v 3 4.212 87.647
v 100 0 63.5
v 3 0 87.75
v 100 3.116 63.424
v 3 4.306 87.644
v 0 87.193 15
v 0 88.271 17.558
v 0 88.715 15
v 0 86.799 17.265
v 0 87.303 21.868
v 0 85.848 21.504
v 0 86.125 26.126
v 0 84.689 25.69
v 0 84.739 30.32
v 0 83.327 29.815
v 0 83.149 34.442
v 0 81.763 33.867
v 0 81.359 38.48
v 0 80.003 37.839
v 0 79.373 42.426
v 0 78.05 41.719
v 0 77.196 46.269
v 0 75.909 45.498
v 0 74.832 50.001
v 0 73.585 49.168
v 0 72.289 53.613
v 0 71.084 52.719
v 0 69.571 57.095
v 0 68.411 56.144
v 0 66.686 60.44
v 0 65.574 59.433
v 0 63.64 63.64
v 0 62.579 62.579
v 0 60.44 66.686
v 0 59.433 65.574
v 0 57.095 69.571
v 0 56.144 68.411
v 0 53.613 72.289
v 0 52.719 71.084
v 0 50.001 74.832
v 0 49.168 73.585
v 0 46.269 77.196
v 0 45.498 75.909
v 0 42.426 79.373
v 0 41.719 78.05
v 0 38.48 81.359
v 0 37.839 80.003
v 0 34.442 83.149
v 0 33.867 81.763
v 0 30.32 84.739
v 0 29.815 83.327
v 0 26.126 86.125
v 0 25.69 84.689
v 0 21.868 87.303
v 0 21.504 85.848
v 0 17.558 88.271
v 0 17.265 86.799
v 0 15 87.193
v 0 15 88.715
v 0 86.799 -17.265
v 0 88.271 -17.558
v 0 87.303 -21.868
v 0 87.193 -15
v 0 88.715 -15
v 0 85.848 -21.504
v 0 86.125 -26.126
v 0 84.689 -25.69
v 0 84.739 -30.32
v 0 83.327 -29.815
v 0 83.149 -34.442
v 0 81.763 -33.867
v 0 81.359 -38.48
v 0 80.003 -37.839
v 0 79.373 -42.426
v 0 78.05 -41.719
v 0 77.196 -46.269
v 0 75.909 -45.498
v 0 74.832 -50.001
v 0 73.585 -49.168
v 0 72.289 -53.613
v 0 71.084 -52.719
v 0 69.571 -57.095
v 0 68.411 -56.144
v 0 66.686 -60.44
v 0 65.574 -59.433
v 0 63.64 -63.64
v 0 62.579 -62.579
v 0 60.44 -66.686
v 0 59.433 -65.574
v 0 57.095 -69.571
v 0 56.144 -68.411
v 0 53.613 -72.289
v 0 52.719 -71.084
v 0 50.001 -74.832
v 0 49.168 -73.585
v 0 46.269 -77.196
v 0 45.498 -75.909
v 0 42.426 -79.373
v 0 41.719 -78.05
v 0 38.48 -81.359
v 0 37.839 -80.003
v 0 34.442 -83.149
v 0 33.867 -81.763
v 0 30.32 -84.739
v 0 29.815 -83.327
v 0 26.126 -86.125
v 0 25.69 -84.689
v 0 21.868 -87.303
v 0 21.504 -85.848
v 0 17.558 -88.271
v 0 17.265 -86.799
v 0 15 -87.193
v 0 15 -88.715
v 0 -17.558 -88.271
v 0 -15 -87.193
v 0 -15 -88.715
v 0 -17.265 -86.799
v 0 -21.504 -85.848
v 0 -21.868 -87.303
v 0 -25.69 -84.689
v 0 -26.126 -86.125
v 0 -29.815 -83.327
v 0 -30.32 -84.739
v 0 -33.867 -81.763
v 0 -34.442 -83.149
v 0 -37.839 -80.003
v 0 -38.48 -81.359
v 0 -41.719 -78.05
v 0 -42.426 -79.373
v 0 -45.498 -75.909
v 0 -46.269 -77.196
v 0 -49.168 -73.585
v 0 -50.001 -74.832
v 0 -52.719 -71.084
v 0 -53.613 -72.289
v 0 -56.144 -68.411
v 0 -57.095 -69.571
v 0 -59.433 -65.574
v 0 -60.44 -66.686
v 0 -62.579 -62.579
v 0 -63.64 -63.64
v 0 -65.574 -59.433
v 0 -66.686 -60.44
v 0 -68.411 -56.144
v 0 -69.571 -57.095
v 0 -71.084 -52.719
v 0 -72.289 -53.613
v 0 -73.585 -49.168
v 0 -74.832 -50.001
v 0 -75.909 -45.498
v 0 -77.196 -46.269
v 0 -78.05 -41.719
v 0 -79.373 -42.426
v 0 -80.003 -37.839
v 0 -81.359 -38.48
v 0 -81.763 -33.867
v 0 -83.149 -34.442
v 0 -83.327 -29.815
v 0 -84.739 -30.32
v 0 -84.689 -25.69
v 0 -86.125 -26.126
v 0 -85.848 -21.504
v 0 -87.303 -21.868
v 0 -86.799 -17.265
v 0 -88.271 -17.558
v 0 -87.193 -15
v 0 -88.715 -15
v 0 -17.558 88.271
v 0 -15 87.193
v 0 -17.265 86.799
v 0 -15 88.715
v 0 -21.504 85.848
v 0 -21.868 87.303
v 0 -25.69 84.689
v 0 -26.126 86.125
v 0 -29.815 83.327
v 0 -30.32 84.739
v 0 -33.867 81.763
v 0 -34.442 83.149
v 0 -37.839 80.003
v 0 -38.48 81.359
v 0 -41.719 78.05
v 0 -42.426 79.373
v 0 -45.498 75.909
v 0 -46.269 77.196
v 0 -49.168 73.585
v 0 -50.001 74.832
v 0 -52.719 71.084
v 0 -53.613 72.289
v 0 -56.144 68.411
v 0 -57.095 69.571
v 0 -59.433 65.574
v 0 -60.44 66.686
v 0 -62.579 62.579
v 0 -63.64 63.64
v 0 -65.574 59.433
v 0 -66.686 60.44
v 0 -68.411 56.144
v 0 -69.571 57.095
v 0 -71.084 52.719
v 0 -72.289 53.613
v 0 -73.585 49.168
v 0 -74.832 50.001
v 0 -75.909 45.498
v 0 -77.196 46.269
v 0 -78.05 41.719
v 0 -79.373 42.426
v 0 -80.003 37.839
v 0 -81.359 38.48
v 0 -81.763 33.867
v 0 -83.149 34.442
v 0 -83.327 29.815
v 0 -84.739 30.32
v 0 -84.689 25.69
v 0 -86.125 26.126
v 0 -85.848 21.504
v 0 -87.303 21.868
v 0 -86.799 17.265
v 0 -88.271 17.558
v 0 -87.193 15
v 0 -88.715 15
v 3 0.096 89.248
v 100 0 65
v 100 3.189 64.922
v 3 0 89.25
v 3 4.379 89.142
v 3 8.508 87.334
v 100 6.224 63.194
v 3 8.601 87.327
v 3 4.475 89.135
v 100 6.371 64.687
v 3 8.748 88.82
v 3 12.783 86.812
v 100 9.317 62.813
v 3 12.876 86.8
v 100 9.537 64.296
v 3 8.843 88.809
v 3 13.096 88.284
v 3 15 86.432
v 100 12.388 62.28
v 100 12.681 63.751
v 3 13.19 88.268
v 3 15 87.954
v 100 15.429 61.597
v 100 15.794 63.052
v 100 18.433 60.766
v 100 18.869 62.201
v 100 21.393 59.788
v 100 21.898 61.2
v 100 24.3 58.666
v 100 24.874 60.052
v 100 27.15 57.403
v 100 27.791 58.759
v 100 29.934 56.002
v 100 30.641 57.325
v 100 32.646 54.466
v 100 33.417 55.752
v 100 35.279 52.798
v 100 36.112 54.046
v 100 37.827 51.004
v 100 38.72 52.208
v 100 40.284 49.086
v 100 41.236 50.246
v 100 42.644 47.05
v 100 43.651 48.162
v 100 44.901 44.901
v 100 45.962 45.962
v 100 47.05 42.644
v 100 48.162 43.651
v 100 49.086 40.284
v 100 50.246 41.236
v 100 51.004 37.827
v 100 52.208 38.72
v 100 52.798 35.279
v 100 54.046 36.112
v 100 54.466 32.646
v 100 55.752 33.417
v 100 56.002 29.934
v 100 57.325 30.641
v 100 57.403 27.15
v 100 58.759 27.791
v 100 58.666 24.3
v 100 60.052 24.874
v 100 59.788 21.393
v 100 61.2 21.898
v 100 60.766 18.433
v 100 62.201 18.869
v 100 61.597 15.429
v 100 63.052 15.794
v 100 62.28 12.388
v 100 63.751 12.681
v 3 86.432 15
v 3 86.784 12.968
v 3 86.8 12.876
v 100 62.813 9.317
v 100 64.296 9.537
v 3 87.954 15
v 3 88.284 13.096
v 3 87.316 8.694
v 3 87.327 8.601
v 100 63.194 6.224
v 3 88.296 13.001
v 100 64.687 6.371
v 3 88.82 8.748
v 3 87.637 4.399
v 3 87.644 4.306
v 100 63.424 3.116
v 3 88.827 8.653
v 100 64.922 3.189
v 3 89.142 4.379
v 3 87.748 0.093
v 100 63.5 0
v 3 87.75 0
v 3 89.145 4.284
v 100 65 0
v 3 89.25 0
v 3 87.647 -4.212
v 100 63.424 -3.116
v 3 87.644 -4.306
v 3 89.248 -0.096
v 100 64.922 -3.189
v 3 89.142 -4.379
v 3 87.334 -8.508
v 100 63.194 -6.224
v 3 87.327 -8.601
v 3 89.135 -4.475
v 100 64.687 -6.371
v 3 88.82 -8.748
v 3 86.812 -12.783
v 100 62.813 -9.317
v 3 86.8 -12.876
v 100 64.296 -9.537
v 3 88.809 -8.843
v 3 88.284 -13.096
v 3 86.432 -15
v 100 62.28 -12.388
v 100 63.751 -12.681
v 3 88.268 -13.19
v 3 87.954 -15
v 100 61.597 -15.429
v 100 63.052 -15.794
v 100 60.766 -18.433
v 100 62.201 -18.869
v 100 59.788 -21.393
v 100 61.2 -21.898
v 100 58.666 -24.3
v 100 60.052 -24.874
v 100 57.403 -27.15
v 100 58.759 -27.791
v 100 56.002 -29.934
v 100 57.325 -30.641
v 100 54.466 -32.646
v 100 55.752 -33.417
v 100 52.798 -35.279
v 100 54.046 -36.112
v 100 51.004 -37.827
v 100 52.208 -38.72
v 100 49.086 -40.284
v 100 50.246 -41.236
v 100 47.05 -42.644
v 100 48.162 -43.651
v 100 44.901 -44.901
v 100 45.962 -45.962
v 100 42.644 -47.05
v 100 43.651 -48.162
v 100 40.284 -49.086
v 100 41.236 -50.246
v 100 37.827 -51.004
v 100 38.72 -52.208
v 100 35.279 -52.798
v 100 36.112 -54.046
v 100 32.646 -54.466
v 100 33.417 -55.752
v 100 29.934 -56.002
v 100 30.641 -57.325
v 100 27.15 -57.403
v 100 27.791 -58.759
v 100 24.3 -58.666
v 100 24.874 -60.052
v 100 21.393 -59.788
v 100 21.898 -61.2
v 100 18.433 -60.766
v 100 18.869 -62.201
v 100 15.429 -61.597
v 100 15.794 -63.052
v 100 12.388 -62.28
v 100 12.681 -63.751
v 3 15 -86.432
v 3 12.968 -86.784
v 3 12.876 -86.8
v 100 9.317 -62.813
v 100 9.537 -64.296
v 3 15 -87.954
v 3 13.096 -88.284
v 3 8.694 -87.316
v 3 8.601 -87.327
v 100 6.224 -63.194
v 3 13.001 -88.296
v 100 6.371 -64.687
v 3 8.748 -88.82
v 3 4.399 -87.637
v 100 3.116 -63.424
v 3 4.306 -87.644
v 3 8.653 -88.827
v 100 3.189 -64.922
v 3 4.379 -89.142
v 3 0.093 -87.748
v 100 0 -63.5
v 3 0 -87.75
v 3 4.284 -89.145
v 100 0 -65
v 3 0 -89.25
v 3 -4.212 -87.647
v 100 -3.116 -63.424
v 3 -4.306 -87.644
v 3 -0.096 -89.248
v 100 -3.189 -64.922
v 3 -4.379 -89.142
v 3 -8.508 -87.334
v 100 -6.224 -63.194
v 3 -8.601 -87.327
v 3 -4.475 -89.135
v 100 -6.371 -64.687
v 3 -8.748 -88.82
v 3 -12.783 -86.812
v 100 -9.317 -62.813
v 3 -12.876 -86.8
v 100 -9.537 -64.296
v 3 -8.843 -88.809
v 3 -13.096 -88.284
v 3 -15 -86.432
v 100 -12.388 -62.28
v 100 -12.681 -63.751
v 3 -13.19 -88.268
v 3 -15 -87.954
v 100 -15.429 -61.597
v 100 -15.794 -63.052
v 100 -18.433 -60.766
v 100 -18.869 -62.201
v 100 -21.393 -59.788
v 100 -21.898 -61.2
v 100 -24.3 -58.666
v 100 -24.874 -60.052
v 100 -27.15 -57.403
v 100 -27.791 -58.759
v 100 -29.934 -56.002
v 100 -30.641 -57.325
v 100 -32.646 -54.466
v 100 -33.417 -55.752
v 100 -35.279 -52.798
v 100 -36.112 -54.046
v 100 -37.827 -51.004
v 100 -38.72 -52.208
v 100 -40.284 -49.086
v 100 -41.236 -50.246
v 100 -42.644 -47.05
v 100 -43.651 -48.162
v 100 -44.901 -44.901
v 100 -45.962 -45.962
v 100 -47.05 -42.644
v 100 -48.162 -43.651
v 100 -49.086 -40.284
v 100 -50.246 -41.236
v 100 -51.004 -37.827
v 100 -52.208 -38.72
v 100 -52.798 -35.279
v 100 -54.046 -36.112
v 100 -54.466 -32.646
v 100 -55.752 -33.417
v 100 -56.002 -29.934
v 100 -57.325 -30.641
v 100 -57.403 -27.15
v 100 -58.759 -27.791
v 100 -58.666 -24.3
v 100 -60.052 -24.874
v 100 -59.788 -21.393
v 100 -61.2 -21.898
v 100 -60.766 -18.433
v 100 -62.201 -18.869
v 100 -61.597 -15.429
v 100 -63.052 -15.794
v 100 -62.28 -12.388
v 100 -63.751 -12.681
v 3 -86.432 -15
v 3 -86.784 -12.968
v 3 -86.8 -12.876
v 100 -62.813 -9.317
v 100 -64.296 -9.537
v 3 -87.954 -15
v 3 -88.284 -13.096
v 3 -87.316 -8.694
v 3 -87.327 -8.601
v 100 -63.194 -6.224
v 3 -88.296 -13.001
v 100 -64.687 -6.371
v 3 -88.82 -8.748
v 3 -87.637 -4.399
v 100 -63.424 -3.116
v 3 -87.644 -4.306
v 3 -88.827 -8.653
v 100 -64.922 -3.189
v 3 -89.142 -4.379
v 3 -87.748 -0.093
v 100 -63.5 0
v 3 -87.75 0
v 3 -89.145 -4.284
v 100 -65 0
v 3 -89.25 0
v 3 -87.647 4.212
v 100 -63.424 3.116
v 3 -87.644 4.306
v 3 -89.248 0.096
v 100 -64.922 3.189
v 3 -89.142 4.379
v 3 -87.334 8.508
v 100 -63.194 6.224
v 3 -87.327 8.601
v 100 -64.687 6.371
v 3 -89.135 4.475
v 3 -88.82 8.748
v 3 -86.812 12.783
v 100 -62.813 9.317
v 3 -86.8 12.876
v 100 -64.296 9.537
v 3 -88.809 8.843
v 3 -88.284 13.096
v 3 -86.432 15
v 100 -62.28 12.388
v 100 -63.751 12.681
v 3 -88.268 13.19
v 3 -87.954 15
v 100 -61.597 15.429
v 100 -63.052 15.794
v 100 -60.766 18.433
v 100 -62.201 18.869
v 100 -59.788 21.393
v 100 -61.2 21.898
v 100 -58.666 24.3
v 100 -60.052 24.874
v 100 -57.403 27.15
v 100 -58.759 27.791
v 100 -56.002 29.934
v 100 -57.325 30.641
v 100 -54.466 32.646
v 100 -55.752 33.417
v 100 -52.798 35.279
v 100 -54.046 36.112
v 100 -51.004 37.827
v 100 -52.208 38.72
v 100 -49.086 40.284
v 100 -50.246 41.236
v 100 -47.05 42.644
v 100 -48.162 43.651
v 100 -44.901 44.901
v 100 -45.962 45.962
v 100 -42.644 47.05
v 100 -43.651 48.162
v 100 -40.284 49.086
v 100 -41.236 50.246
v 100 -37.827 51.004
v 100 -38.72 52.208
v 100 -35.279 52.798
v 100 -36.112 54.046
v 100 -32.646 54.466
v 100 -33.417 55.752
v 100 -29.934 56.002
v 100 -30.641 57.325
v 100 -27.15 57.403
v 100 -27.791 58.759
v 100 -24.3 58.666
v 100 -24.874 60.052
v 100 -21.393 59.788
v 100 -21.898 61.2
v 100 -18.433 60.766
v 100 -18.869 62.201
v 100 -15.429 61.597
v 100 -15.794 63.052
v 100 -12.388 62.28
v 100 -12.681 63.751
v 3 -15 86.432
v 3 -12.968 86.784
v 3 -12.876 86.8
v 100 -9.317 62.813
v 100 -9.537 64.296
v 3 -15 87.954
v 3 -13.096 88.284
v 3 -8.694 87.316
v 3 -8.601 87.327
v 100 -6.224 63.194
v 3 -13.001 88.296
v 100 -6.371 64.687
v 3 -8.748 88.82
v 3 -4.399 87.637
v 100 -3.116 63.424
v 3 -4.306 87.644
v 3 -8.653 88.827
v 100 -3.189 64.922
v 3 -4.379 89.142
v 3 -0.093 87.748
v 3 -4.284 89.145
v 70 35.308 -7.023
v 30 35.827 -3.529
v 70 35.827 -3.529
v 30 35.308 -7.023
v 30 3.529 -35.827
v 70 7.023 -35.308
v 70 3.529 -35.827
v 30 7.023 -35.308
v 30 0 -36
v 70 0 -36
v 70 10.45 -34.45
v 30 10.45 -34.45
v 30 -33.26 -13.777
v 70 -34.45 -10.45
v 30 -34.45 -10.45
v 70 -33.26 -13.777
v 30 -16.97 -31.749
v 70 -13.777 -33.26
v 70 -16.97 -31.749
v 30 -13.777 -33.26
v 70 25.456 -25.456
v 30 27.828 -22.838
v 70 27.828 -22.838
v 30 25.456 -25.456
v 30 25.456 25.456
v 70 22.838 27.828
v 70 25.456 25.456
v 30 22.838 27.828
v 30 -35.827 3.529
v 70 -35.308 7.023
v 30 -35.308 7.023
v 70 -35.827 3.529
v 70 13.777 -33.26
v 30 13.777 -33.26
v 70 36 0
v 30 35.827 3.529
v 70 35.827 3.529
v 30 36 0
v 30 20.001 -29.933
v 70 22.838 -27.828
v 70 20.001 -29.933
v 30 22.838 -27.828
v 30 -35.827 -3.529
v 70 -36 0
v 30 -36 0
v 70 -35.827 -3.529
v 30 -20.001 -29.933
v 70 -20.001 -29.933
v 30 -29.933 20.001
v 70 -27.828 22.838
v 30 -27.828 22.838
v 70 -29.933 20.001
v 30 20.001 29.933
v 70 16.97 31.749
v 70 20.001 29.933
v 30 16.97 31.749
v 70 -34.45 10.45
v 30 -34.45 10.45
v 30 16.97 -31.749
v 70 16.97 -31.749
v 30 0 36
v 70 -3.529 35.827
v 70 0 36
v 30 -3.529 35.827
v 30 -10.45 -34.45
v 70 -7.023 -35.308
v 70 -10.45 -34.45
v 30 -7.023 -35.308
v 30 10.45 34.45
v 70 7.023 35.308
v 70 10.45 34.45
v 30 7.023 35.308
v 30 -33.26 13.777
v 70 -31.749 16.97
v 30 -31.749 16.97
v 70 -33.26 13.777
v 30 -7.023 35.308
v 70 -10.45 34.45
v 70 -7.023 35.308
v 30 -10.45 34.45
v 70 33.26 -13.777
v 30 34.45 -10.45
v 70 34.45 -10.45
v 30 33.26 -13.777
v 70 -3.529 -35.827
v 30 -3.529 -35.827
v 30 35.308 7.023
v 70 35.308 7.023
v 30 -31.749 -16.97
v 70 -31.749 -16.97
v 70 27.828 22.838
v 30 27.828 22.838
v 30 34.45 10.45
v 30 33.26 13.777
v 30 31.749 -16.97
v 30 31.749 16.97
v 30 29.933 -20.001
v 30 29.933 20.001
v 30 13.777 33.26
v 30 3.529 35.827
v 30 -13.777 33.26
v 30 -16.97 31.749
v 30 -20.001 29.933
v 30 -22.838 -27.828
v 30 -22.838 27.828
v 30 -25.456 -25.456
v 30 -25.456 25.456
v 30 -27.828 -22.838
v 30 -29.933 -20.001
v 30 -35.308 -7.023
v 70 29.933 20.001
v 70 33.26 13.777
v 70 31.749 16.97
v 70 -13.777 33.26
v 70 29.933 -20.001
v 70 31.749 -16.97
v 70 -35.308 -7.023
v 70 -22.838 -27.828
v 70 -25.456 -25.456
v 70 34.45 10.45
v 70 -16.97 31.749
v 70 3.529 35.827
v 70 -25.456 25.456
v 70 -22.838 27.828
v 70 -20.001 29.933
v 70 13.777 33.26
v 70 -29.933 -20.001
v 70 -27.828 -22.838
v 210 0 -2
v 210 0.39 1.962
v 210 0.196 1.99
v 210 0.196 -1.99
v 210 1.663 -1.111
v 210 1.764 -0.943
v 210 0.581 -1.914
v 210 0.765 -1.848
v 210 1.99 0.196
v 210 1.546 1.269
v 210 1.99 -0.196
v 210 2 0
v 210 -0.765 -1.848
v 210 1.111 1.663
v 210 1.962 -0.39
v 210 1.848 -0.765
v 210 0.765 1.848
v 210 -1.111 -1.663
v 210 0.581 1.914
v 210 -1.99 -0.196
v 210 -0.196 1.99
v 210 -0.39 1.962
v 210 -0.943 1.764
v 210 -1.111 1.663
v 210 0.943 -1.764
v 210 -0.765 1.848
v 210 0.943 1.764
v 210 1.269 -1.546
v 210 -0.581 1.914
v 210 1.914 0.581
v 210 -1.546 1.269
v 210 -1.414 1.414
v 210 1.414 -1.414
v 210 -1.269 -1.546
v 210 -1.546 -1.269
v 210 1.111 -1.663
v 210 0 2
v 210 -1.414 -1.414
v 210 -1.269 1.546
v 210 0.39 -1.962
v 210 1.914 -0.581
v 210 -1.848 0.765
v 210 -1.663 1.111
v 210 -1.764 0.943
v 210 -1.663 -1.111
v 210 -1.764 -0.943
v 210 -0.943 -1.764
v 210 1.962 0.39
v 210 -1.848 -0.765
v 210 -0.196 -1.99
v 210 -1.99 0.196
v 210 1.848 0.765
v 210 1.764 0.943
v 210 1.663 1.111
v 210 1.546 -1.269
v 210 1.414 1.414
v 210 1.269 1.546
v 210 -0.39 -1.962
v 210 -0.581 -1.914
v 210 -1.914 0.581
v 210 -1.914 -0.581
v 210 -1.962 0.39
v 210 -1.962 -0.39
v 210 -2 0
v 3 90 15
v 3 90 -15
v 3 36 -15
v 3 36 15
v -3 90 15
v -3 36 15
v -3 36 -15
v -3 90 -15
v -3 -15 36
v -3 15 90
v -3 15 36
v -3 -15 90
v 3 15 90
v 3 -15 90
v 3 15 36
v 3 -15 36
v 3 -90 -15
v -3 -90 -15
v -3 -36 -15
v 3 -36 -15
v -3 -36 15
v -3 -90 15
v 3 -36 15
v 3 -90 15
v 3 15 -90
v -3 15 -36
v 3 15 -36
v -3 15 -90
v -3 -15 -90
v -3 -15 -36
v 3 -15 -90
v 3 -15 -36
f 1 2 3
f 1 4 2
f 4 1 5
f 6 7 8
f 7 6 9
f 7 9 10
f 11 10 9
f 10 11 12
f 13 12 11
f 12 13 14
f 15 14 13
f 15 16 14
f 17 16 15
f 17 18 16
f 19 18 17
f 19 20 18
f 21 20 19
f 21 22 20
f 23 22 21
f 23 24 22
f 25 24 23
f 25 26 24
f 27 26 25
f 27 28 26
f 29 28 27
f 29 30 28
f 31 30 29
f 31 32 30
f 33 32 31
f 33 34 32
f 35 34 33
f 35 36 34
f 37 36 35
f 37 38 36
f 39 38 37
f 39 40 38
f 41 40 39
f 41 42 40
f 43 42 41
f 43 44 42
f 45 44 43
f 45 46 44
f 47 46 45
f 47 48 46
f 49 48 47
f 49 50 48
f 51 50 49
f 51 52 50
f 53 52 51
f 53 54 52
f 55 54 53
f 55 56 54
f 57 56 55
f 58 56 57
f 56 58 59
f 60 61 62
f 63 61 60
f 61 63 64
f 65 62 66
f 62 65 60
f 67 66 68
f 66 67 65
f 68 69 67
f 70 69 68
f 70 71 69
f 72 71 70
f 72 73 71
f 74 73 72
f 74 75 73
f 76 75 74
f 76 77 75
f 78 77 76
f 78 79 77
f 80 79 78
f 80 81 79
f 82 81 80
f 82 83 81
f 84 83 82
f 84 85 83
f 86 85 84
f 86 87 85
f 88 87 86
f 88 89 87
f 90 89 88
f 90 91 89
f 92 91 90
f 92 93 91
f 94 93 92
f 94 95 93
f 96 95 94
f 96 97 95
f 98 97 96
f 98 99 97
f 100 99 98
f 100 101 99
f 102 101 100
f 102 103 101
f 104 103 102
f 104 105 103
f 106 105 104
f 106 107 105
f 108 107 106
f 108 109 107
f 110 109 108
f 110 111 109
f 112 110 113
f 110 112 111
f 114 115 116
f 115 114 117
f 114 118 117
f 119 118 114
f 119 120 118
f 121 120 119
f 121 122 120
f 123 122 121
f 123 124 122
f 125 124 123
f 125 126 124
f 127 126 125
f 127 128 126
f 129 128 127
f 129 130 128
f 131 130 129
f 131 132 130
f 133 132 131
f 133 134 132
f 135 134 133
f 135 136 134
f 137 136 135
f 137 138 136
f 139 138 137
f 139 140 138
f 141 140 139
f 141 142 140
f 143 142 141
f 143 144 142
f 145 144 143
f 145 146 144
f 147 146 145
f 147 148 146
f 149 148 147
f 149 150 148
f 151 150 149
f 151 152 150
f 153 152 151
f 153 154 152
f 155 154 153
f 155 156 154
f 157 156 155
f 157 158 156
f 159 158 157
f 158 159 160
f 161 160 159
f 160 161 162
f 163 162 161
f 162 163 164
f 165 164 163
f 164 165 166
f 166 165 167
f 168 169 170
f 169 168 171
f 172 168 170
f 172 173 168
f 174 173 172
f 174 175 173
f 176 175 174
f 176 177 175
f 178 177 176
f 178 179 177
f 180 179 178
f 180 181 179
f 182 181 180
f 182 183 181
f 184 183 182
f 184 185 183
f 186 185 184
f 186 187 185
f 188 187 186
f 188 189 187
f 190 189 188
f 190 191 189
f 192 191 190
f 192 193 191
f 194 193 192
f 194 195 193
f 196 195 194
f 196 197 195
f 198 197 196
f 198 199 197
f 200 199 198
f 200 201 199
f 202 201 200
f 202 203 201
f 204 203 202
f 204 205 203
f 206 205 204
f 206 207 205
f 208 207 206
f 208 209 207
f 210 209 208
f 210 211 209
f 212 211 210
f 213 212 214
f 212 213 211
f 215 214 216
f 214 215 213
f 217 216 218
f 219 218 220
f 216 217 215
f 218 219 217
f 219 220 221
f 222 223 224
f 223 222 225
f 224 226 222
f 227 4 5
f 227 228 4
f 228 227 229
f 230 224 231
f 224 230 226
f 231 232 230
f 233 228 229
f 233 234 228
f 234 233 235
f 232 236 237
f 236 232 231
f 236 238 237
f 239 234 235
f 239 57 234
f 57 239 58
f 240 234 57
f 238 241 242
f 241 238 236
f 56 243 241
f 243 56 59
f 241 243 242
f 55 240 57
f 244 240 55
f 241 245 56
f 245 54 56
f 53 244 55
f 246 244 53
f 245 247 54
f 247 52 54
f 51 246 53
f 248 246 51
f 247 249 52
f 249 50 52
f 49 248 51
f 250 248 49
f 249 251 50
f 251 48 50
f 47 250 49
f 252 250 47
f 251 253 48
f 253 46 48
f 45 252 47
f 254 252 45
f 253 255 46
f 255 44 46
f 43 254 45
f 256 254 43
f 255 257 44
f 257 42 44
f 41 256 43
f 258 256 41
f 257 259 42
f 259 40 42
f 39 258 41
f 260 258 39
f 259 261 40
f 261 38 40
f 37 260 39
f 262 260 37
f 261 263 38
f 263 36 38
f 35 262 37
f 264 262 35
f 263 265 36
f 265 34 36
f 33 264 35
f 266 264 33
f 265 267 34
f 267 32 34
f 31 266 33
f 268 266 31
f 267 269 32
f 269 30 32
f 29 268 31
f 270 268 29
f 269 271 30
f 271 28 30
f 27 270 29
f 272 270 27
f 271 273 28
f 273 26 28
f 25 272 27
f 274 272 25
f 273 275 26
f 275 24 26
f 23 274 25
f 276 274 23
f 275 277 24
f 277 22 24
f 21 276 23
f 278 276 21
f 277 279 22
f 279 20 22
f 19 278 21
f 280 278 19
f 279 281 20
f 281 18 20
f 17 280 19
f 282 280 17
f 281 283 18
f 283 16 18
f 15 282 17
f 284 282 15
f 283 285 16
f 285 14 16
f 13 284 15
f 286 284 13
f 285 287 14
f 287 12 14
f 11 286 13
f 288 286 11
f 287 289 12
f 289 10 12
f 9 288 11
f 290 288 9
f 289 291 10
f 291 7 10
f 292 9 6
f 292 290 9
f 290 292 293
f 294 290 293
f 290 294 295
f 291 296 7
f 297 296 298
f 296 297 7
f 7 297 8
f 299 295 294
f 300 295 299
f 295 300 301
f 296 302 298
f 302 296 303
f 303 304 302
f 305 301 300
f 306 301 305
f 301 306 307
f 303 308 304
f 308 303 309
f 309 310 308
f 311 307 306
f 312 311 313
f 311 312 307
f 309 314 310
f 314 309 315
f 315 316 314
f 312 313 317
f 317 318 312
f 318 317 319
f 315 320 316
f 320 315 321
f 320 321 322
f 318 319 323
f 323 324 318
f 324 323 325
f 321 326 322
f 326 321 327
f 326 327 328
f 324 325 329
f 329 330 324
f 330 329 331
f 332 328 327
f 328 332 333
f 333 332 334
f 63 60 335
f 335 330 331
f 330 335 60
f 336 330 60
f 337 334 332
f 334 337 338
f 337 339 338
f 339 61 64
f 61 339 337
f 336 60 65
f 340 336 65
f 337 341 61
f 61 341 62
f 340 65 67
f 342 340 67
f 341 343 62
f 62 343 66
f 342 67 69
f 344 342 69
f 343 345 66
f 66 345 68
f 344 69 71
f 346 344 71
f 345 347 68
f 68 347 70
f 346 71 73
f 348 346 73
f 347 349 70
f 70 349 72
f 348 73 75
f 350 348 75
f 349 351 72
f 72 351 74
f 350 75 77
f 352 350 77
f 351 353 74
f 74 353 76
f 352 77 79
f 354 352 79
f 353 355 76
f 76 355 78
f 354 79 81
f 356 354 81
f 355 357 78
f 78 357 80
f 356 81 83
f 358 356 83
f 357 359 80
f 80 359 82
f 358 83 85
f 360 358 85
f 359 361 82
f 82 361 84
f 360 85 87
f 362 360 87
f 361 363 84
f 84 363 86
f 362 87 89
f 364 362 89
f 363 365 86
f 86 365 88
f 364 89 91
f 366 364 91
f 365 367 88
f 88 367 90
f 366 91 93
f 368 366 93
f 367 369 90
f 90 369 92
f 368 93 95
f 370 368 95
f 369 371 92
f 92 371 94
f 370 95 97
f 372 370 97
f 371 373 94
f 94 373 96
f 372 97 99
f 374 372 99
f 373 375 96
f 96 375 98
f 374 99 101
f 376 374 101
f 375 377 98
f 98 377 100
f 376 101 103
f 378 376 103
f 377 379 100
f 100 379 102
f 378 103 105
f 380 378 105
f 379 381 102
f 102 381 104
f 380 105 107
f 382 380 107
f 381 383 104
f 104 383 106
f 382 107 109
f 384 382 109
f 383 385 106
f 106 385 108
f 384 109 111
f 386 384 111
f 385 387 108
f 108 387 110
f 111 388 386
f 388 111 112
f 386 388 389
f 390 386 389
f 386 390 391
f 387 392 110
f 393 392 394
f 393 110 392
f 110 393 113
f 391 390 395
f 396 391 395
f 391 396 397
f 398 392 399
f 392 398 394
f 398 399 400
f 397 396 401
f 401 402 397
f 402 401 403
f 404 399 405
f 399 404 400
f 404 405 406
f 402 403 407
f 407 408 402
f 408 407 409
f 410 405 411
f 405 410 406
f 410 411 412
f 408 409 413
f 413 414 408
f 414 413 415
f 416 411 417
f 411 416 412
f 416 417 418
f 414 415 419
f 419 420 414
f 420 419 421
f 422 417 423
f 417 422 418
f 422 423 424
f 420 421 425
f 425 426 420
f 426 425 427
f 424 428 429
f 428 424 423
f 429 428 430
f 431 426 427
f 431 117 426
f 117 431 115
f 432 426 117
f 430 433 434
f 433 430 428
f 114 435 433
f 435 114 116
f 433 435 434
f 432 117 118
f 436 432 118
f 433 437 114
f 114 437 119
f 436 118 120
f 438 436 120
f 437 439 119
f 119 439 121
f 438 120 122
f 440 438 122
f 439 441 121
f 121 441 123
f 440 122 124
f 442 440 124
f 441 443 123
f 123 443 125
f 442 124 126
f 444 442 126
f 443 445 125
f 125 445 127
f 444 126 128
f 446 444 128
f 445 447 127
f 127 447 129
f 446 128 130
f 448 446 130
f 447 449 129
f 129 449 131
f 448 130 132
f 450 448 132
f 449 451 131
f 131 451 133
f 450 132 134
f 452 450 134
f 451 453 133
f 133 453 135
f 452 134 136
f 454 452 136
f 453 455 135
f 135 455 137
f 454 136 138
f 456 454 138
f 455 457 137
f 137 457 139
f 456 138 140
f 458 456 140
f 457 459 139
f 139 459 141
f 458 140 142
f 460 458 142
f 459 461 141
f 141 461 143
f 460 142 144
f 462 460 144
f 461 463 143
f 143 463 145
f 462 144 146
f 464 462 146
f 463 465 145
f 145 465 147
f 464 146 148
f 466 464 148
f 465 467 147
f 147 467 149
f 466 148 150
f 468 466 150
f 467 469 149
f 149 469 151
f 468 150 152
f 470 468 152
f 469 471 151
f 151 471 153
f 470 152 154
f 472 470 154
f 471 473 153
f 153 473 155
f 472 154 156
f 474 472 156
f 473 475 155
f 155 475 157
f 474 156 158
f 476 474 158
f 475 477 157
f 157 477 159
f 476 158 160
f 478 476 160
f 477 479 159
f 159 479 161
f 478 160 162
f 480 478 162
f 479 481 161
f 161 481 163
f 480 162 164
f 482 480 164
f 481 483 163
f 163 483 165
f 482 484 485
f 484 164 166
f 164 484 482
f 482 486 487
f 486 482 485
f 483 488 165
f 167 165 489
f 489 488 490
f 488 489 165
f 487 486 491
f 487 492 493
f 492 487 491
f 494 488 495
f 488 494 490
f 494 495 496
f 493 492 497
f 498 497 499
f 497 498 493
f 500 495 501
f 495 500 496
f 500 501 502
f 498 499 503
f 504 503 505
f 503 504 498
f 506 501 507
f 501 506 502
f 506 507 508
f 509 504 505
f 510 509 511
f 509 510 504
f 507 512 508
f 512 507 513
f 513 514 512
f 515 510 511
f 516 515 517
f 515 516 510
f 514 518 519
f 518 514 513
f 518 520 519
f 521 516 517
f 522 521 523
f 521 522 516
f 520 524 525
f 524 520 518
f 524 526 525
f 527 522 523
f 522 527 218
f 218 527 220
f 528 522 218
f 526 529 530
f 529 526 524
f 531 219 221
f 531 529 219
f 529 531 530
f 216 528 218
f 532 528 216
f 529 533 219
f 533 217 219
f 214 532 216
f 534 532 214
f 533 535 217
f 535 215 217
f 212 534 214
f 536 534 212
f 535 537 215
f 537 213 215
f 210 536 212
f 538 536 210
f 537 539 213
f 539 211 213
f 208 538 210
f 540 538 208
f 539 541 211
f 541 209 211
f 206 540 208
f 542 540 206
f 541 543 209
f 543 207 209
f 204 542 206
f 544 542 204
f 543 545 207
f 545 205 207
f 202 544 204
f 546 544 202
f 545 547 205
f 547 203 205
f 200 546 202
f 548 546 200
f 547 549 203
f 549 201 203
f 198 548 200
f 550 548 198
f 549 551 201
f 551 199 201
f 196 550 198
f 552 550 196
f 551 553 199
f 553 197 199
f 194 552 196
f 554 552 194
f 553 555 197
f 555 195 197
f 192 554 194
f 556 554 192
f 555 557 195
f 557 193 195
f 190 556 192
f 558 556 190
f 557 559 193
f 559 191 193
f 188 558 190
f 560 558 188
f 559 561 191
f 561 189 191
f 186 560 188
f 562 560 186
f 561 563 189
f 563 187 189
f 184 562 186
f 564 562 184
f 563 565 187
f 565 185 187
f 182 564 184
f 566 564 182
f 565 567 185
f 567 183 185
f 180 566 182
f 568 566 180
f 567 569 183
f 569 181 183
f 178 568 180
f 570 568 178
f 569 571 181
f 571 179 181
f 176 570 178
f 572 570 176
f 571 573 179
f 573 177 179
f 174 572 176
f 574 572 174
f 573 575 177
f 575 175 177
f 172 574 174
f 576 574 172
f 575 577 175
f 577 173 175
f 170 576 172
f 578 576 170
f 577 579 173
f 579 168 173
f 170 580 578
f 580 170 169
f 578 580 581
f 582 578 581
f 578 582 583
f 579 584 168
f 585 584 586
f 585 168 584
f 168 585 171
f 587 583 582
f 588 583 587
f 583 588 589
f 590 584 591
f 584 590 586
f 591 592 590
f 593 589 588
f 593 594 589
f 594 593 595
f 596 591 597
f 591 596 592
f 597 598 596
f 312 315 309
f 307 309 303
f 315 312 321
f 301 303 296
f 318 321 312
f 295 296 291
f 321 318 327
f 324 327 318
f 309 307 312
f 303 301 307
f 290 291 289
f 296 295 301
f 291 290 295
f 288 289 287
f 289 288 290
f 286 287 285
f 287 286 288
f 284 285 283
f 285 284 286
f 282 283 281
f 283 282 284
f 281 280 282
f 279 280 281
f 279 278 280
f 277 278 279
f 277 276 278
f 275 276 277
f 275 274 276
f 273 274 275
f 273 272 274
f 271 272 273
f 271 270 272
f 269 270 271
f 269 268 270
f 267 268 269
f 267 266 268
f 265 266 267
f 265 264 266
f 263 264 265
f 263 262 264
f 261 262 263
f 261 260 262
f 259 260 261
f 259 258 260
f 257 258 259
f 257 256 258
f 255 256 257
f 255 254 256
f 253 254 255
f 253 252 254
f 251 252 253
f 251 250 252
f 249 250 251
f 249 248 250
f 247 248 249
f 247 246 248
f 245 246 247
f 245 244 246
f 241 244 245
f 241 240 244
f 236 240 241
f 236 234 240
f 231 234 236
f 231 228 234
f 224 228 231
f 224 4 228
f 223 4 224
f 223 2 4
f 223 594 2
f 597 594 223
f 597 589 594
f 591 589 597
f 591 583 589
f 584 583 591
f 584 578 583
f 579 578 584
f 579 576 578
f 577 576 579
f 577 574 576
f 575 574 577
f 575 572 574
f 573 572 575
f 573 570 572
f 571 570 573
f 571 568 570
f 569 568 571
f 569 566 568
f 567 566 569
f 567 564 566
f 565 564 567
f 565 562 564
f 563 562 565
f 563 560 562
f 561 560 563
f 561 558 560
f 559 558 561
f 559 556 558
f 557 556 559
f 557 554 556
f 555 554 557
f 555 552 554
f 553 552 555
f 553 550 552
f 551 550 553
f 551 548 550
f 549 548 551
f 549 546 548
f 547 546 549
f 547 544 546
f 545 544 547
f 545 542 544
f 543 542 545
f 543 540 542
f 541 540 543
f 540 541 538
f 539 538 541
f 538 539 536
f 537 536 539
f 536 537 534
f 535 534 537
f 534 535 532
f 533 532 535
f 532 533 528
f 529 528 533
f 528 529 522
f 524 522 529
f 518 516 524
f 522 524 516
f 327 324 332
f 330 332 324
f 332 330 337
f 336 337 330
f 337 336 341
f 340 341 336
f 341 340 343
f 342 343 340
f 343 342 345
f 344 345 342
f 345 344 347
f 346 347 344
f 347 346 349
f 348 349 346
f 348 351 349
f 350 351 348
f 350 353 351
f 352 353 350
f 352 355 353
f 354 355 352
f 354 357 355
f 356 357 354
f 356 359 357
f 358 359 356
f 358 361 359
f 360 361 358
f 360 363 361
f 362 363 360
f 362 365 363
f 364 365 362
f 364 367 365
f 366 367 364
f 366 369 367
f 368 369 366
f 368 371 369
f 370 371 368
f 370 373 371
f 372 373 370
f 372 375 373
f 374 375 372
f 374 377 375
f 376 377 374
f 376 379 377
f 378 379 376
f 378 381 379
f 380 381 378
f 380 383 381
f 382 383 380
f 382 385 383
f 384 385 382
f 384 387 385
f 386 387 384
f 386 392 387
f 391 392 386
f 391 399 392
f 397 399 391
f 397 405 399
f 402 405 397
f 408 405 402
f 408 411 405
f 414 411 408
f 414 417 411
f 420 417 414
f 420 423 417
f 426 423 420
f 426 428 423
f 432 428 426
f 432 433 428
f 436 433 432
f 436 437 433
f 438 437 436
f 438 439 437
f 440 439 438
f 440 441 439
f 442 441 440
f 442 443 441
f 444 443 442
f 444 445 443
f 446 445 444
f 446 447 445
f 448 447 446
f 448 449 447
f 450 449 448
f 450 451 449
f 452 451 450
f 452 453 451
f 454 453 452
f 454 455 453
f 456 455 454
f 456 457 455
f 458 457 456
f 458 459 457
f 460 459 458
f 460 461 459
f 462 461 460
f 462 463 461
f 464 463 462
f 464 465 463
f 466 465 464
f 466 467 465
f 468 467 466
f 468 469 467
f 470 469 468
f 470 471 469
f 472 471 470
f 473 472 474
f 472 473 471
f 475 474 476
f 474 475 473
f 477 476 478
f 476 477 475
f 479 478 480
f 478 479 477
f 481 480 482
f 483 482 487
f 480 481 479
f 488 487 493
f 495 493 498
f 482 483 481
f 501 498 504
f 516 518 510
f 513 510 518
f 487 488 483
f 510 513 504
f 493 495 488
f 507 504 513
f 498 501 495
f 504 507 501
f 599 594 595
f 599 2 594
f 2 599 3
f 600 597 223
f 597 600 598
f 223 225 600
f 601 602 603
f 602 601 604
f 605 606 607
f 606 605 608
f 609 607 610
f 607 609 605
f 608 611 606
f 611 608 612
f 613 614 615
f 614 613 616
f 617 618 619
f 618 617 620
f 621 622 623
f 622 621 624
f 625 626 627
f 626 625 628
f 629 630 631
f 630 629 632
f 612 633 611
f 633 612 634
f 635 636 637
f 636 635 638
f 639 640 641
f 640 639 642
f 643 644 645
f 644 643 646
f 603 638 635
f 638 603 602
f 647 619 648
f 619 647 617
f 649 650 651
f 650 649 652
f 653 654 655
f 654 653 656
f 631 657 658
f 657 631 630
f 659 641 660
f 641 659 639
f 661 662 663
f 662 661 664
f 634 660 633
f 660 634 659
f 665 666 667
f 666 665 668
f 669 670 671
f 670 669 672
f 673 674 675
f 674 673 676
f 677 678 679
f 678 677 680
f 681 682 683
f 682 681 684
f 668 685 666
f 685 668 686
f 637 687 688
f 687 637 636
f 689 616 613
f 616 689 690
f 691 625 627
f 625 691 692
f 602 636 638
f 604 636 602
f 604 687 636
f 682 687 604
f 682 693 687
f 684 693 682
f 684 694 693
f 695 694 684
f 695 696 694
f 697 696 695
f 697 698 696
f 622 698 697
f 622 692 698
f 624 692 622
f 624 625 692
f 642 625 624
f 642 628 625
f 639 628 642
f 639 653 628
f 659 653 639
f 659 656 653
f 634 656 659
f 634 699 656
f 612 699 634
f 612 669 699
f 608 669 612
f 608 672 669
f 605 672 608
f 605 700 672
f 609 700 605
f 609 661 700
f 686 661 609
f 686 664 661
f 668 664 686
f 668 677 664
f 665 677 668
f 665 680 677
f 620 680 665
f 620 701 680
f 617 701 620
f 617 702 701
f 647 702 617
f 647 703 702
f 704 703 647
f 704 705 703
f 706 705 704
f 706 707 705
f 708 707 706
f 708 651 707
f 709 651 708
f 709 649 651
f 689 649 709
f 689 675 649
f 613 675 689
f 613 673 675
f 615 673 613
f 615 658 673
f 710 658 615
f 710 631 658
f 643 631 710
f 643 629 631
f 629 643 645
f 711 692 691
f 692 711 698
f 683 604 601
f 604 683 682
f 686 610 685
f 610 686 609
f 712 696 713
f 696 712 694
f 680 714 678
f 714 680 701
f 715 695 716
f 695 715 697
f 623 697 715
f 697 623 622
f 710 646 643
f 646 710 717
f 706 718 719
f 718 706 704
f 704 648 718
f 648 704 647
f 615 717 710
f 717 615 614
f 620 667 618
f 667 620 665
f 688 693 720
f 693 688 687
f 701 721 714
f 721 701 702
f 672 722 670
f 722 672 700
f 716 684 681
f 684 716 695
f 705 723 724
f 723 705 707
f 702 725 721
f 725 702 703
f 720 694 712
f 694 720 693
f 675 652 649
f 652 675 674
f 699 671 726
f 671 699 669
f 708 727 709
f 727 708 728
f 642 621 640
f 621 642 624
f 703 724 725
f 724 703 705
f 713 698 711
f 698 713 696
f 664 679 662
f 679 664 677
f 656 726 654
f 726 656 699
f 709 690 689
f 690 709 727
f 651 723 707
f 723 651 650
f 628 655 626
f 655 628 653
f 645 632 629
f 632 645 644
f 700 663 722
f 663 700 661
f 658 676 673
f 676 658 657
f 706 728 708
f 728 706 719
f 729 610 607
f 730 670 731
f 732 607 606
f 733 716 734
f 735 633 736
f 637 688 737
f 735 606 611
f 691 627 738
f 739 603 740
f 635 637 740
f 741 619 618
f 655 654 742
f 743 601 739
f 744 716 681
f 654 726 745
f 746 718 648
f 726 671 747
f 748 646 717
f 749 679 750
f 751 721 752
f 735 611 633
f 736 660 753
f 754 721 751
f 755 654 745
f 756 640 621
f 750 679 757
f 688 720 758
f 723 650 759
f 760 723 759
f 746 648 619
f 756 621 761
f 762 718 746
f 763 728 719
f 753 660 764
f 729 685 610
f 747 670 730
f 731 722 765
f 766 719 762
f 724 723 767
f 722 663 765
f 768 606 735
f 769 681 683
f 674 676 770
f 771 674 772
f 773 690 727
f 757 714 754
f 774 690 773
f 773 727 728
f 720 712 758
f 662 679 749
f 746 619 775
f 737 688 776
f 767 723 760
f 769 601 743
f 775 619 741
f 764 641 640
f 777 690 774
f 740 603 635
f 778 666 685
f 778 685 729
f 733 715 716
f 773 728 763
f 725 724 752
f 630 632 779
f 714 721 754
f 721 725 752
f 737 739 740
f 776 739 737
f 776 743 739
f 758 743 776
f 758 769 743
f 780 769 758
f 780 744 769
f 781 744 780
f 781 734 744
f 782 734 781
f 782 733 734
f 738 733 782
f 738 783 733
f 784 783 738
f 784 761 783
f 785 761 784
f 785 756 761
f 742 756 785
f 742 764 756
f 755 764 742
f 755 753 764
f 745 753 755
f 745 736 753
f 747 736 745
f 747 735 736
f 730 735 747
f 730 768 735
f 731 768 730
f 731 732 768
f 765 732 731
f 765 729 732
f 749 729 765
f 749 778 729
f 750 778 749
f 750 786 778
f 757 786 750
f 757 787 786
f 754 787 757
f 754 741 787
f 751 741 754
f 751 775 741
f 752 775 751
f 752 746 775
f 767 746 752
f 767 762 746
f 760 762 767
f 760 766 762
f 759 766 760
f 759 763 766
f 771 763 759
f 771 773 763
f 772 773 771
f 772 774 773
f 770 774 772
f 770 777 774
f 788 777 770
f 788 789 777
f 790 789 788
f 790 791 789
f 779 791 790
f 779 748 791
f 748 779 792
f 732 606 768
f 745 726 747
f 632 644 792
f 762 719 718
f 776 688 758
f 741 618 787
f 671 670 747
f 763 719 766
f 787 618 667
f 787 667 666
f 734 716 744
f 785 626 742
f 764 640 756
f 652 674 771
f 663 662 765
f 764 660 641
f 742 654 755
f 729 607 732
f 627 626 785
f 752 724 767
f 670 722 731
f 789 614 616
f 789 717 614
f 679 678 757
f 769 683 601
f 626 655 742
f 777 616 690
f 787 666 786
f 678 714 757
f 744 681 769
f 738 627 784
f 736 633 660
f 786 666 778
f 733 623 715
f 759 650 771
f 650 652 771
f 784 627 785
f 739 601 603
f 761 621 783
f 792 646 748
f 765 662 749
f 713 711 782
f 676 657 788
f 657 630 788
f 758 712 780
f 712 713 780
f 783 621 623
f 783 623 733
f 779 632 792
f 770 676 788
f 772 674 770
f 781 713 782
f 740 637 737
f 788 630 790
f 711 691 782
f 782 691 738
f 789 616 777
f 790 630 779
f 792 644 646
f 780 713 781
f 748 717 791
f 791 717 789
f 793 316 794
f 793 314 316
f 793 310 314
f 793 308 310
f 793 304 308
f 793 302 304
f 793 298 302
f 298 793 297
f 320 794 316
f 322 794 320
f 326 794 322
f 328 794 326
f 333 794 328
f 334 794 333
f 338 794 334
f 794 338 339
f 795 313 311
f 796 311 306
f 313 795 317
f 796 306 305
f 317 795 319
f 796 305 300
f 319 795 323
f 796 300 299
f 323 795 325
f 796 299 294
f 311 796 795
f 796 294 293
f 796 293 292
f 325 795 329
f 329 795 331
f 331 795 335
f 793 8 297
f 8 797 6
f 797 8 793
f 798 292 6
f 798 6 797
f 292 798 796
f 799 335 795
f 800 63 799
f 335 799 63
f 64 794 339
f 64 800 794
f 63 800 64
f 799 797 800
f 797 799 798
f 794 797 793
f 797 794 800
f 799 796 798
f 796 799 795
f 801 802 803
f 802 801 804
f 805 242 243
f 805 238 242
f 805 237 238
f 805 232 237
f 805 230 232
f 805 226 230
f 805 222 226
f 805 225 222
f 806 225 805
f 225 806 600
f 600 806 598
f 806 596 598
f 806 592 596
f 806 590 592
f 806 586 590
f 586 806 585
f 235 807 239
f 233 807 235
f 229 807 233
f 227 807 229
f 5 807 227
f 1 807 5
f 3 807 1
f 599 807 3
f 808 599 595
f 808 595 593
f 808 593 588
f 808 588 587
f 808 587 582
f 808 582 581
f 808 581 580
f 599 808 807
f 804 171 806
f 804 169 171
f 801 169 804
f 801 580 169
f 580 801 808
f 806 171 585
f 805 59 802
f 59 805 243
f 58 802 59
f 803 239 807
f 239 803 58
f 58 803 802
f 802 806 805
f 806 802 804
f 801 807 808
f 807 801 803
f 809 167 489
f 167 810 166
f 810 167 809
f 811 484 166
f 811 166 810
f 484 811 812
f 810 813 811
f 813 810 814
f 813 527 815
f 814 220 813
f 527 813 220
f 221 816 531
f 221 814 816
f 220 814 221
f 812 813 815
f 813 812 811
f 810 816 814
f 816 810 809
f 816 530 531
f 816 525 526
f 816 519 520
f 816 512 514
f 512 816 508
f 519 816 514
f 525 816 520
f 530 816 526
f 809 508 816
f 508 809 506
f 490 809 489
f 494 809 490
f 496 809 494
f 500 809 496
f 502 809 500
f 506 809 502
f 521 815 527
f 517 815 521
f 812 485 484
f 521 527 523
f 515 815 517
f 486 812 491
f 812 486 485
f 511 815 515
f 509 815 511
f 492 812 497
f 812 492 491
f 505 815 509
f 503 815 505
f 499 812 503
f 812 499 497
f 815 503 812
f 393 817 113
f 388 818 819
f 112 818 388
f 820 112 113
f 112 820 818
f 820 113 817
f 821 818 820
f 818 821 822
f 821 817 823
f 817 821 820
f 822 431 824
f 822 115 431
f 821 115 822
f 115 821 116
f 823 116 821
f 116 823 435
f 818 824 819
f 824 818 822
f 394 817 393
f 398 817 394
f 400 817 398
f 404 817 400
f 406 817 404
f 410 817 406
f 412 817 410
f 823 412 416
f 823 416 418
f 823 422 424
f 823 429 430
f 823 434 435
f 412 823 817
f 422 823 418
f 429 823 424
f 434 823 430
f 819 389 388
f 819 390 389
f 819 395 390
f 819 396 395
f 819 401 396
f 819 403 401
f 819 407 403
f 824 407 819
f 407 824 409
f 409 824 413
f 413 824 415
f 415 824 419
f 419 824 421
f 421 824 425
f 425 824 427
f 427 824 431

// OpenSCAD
// file: convergent_nozzle.scad
/**
 * @file convergent_nozzle.scad
 * @brief Convergent Exhaust Nozzle 3D Model
 * @details Models a smooth convergent contour using rotate_extrude and Bezier-like wall profiles.
 * 
 * Copyright (c) 2026 AEGIS-TF1 Systems Development Group.
 */

use <../utils/parametric_helpers.scad>

/**
 * @brief Convergent exhaust nozzle shell
 * @param inlet_diameter Inlet diameter matching turbine outer duct (mm)
 * @param exit_diameter Exit throat diameter (mm)
 * @param length Length along nozzle axis (mm)
 */
module convergent_nozzle(inlet_diameter=180, exit_diameter=120, length=90) {
    inlet_r = inlet_diameter / 2.0;
    exit_r = exit_diameter / 2.0;
    thickness = 1.5; // sheet metal thickness

    color("dimgrey")
    translate([length/2.0, 0, 0])
    rotate([0, 90, 0]) // Align nozzle along X-axis
    difference() {
        // Tapering outer profile
        rotate_extrude($fn=128)
        polygon(points=[
            [inlet_r, -length/2.0],
            [exit_r, length/2.0],
            [exit_r - thickness, length/2.0],
            [inlet_r - thickness, -length/2.0]
        ]);

        // Clean out central core if any polygon overlaps occurred
        cylinder(h=length + 2.0, r=exit_r - thickness, center=true, $fn=128);
    }
}

// Preview
convergent_nozzle();
// file: ../utils/parametric_helpers.scad
/**
 * @file parametric_helpers.scad
 * @brief Parametric 3D Modeling Utility Library
 * @details Contains shared constants, modules, and functions for geometric arraying,
 *          rounded cylinders, and coordinate transformations.
 * 
 * Copyright (c) 2026 AEGIS-TF1 Systems Development Group.
 */

// Global Constants
PI = 3.14159265358979323846;
GOLDEN_RATIO = 1.618033988749894;
TOLERANCE = 0.05;

// Functions
function deg2rad(d) = d * PI / 180.0;
function rad2deg(r) = r * 180.0 / PI;
function lerp(a, b, t) = a + (b - a) * t;

// Modules

/**
 * @brief Distributes children shapes in a circular array
 * @param n Number of instances
 * @param radius Radius of array circle
 */
module circular_array(n, radius) {
    for (i = [0 : n - 1]) {
        angle = i * 360.0 / n;
        rotate([0, 0, angle])
        translate([radius, 0, 0])
        children();
    }
}

/**
 * @brief Distributes children shapes in a linear array along X-axis
 * @param n Number of instances
 * @param spacing Distance between instances
 */
module linear_array(n, spacing) {
    for (i = [0 : n - 1]) {
        translate([i * spacing, 0, 0])
        children();
    }
}

/**
 * @brief Hollow cylinder (tube) along Z-axis
 * @param h Tube height
 * @param outer_r Outer radius
 * @param inner_r Inner radius
 * @param fn Resolution
 */
module tube(h, outer_r, inner_r, fn=64) {
    difference() {
        cylinder(h=h, r=outer_r, center=true, $fn=fn);
        cylinder(h=h + TOLERANCE * 2.0, r=inner_r, center=true, $fn=fn);
    }
}

/**
 * @brief Torus shape centered at origin
 * @param R Major radius (ring center distance)
 * @param r Minor radius (cross section radius)
 * @param fn Resolution
 */
module torus(R, r, fn=64) {
    rotate_extrude($fn=fn)
    translate([R, 0, 0])
    circle(r=r, $fn=fn);
}

/**
 * @brief Rounded cylinder (filleted top and bottom edges) using Minkowski
 * @param h Height
 * @param r Radius
 * @param fillet_r Edge radius
 * @param fn Resolution
 */
module rounded_cylinder(h, r, fillet_r, fn=64) {
    minkowski() {
        cylinder(h = h - 2.0 * fillet_r, r = r - fillet_r, center = true, $fn = fn);
        sphere(r = fillet_r, $fn = fn);
    }
}

/**
 * @brief 2D fillet helper
 * @param r Fillet radius
 */
module fillet_2d(r) {
    difference() {
        square([r, r]);
        translate([r, r])
        circle(r=r, $fn=64);
    }
}

/**
 * @brief 2D chamfer helper
 * @param size Chamfer length
 */
module chamfer_2d(size) {
    polygon(points=[[0,0], [size,0], [0,size]]);
}

/**
 * @brief Ball bearing assembly (inner ring, outer ring, balls)
 */
module bearing_assembly(inner_dia, outer_dia, width, num_balls=10) {
    color("silver")
    difference() {
        // Outer ring
        cylinder(h=width, r=outer_dia / 2.0, center=true, $fn=64);
        cylinder(h=width + 1.0, r=(outer_dia + inner_dia)/4.0 + (outer_dia - inner_dia)/8.0 * 0.8, center=true, $fn=64);
    }
    color("silver")
    difference() {
        // Inner ring
        cylinder(h=width, r=(outer_dia + inner_dia)/4.0 - (outer_dia - inner_dia)/8.0 * 0.8, center=true, $fn=64);
        cylinder(h=width + 1.0, r=inner_dia / 2.0, center=true, $fn=64);
    }
    // Balls (arranged in circular array)
    color([0.9, 0.92, 0.95]) // Chrome steel bearing balls
    let (ball_radius = (outer_dia - inner_dia) / 8.0, pitch_radius = (outer_dia + inner_dia) / 4.0) {
        circular_array(n=num_balls, radius=pitch_radius)
        sphere(r=ball_radius * 0.95, $fn=32);
    }
}

/**
 * @brief Bolted assembly flange with hexagonal head bolts
 */
module bolted_flange(outer_r, inner_r, thickness, num_bolts=16, bolt_r=2.5) {
    color("darkgray")
    difference() {
        // Flange ring
        cylinder(h=thickness, r=outer_r, center=true, $fn=128);
        cylinder(h=thickness + 1.0, r=inner_r, center=true, $fn=128);
        
        // Bolt holes
        circular_array(n=num_bolts, radius=(outer_r + inner_r)/2.0)
        cylinder(h=thickness + 2.0, r=bolt_r, center=true, $fn=16);
    }
    // Hexagonal bolts
    color([0.72, 0.73, 0.75]) // Hardened steel zinc-plated bolts
    circular_array(n=num_bolts, radius=(outer_r + inner_r)/2.0)
    translate([0, 0, thickness/2.0])
    cylinder(h=bolt_r * 1.5, r=bolt_r * 1.6, center=false, $fn=6);
}

/**
 * @brief Dovetail slot profile shape for cutting blade roots
 */
module dovetail_slot_profile(width, height) {
    polygon(points=[
        [-width * 0.76 / 2.0, height/2.0],
        [width * 0.76 / 2.0, height/2.0],
        [width/2.0, -height/2.0],
        [-width/2.0, -height/2.0]
    ]);
}

/*
// Preview Examples
translate([0, 0, 0]) {
    // Tube example
    color("teal") tube(h=30, outer_r=15, inner_r=12);
    
    // Torus example
    translate([45, 0, 0])
    color("crimson") torus(R=20, r=4);

    // Rounded Cylinder example
    translate([-45, 0, 0])
    color([0.75, 0.65, 0.4]) rounded_cylinder(h=25, r=10, fillet_r=2.0);

    // Bearing example
    translate([0, 45, 0])
    bearing_assembly(inner_dia=20, outer_dia=40, width=12);

    // Bolted Flange example
    translate([0, -45, 0])
    bolted_flange(outer_r=30, inner_r=20, thickness=6, num_bolts=12);
}
*/
// main file
/**
 * @file exhaust_nozzle.scad
 * @brief Complete Exhaust Nozzle Assembly with Tail Cone
 * @details Models the outer cowl and the aerodynamic center body (tail cone)
 *          forming an annular exhaust passage.
 * 
 * Copyright (c) 2026 AEGIS-TF1 Systems Development Group.
 */

use <../utils/parametric_helpers.scad>
use <convergent_nozzle.scad>

/**
 * @brief Annular exhaust nozzle assembly
 * @param inlet_dia Inlet passage diameter (mm)
 * @param exit_dia Throat exit diameter (mm)
 * @param cone_length Center tail cone length (mm)
 */
module exhaust_nozzle(inlet_dia=180, exit_dia=130, cone_length=180) {
    // 1. Outer Convergent Nozzle Cowl
    convergent_nozzle(inlet_diameter=inlet_dia, exit_diameter=exit_dia, length=100);

    // 2. Aerodynamic Center Tail Cone
    color("darkslategray")
    translate([cone_length / 2.0 - 40, 0, 0]) // Position along nozzle axis
    rotate([0, 90, 0])
    union() {
        // Cylindrical mounting base
        cylinder(h=40, r=inlet_dia * 0.40 / 2.0, center=true, $fn=64);
        
        // Tapered aerodynamic tail cone shape
        translate([0, 0, 20])
        cylinder(h=cone_length - 40, r1=inlet_dia * 0.40 / 2.0, r2=2, center=false, $fn=64);
    }

    // 3. Center Body Support Struts
    color("gray")
    for (i = [0 : 3]) {
        angle = i * 90.0;
        rotate([angle, 0, 0])
        translate([0, (inlet_dia * 0.40 / 2.0 + inlet_dia / 2.0) / 2.0, 0])
        cube([6, (inlet_dia / 2.0 - inlet_dia * 0.40 / 2.0), 30], center=true);
    }
}

// Preview
exhaust_nozzle();
